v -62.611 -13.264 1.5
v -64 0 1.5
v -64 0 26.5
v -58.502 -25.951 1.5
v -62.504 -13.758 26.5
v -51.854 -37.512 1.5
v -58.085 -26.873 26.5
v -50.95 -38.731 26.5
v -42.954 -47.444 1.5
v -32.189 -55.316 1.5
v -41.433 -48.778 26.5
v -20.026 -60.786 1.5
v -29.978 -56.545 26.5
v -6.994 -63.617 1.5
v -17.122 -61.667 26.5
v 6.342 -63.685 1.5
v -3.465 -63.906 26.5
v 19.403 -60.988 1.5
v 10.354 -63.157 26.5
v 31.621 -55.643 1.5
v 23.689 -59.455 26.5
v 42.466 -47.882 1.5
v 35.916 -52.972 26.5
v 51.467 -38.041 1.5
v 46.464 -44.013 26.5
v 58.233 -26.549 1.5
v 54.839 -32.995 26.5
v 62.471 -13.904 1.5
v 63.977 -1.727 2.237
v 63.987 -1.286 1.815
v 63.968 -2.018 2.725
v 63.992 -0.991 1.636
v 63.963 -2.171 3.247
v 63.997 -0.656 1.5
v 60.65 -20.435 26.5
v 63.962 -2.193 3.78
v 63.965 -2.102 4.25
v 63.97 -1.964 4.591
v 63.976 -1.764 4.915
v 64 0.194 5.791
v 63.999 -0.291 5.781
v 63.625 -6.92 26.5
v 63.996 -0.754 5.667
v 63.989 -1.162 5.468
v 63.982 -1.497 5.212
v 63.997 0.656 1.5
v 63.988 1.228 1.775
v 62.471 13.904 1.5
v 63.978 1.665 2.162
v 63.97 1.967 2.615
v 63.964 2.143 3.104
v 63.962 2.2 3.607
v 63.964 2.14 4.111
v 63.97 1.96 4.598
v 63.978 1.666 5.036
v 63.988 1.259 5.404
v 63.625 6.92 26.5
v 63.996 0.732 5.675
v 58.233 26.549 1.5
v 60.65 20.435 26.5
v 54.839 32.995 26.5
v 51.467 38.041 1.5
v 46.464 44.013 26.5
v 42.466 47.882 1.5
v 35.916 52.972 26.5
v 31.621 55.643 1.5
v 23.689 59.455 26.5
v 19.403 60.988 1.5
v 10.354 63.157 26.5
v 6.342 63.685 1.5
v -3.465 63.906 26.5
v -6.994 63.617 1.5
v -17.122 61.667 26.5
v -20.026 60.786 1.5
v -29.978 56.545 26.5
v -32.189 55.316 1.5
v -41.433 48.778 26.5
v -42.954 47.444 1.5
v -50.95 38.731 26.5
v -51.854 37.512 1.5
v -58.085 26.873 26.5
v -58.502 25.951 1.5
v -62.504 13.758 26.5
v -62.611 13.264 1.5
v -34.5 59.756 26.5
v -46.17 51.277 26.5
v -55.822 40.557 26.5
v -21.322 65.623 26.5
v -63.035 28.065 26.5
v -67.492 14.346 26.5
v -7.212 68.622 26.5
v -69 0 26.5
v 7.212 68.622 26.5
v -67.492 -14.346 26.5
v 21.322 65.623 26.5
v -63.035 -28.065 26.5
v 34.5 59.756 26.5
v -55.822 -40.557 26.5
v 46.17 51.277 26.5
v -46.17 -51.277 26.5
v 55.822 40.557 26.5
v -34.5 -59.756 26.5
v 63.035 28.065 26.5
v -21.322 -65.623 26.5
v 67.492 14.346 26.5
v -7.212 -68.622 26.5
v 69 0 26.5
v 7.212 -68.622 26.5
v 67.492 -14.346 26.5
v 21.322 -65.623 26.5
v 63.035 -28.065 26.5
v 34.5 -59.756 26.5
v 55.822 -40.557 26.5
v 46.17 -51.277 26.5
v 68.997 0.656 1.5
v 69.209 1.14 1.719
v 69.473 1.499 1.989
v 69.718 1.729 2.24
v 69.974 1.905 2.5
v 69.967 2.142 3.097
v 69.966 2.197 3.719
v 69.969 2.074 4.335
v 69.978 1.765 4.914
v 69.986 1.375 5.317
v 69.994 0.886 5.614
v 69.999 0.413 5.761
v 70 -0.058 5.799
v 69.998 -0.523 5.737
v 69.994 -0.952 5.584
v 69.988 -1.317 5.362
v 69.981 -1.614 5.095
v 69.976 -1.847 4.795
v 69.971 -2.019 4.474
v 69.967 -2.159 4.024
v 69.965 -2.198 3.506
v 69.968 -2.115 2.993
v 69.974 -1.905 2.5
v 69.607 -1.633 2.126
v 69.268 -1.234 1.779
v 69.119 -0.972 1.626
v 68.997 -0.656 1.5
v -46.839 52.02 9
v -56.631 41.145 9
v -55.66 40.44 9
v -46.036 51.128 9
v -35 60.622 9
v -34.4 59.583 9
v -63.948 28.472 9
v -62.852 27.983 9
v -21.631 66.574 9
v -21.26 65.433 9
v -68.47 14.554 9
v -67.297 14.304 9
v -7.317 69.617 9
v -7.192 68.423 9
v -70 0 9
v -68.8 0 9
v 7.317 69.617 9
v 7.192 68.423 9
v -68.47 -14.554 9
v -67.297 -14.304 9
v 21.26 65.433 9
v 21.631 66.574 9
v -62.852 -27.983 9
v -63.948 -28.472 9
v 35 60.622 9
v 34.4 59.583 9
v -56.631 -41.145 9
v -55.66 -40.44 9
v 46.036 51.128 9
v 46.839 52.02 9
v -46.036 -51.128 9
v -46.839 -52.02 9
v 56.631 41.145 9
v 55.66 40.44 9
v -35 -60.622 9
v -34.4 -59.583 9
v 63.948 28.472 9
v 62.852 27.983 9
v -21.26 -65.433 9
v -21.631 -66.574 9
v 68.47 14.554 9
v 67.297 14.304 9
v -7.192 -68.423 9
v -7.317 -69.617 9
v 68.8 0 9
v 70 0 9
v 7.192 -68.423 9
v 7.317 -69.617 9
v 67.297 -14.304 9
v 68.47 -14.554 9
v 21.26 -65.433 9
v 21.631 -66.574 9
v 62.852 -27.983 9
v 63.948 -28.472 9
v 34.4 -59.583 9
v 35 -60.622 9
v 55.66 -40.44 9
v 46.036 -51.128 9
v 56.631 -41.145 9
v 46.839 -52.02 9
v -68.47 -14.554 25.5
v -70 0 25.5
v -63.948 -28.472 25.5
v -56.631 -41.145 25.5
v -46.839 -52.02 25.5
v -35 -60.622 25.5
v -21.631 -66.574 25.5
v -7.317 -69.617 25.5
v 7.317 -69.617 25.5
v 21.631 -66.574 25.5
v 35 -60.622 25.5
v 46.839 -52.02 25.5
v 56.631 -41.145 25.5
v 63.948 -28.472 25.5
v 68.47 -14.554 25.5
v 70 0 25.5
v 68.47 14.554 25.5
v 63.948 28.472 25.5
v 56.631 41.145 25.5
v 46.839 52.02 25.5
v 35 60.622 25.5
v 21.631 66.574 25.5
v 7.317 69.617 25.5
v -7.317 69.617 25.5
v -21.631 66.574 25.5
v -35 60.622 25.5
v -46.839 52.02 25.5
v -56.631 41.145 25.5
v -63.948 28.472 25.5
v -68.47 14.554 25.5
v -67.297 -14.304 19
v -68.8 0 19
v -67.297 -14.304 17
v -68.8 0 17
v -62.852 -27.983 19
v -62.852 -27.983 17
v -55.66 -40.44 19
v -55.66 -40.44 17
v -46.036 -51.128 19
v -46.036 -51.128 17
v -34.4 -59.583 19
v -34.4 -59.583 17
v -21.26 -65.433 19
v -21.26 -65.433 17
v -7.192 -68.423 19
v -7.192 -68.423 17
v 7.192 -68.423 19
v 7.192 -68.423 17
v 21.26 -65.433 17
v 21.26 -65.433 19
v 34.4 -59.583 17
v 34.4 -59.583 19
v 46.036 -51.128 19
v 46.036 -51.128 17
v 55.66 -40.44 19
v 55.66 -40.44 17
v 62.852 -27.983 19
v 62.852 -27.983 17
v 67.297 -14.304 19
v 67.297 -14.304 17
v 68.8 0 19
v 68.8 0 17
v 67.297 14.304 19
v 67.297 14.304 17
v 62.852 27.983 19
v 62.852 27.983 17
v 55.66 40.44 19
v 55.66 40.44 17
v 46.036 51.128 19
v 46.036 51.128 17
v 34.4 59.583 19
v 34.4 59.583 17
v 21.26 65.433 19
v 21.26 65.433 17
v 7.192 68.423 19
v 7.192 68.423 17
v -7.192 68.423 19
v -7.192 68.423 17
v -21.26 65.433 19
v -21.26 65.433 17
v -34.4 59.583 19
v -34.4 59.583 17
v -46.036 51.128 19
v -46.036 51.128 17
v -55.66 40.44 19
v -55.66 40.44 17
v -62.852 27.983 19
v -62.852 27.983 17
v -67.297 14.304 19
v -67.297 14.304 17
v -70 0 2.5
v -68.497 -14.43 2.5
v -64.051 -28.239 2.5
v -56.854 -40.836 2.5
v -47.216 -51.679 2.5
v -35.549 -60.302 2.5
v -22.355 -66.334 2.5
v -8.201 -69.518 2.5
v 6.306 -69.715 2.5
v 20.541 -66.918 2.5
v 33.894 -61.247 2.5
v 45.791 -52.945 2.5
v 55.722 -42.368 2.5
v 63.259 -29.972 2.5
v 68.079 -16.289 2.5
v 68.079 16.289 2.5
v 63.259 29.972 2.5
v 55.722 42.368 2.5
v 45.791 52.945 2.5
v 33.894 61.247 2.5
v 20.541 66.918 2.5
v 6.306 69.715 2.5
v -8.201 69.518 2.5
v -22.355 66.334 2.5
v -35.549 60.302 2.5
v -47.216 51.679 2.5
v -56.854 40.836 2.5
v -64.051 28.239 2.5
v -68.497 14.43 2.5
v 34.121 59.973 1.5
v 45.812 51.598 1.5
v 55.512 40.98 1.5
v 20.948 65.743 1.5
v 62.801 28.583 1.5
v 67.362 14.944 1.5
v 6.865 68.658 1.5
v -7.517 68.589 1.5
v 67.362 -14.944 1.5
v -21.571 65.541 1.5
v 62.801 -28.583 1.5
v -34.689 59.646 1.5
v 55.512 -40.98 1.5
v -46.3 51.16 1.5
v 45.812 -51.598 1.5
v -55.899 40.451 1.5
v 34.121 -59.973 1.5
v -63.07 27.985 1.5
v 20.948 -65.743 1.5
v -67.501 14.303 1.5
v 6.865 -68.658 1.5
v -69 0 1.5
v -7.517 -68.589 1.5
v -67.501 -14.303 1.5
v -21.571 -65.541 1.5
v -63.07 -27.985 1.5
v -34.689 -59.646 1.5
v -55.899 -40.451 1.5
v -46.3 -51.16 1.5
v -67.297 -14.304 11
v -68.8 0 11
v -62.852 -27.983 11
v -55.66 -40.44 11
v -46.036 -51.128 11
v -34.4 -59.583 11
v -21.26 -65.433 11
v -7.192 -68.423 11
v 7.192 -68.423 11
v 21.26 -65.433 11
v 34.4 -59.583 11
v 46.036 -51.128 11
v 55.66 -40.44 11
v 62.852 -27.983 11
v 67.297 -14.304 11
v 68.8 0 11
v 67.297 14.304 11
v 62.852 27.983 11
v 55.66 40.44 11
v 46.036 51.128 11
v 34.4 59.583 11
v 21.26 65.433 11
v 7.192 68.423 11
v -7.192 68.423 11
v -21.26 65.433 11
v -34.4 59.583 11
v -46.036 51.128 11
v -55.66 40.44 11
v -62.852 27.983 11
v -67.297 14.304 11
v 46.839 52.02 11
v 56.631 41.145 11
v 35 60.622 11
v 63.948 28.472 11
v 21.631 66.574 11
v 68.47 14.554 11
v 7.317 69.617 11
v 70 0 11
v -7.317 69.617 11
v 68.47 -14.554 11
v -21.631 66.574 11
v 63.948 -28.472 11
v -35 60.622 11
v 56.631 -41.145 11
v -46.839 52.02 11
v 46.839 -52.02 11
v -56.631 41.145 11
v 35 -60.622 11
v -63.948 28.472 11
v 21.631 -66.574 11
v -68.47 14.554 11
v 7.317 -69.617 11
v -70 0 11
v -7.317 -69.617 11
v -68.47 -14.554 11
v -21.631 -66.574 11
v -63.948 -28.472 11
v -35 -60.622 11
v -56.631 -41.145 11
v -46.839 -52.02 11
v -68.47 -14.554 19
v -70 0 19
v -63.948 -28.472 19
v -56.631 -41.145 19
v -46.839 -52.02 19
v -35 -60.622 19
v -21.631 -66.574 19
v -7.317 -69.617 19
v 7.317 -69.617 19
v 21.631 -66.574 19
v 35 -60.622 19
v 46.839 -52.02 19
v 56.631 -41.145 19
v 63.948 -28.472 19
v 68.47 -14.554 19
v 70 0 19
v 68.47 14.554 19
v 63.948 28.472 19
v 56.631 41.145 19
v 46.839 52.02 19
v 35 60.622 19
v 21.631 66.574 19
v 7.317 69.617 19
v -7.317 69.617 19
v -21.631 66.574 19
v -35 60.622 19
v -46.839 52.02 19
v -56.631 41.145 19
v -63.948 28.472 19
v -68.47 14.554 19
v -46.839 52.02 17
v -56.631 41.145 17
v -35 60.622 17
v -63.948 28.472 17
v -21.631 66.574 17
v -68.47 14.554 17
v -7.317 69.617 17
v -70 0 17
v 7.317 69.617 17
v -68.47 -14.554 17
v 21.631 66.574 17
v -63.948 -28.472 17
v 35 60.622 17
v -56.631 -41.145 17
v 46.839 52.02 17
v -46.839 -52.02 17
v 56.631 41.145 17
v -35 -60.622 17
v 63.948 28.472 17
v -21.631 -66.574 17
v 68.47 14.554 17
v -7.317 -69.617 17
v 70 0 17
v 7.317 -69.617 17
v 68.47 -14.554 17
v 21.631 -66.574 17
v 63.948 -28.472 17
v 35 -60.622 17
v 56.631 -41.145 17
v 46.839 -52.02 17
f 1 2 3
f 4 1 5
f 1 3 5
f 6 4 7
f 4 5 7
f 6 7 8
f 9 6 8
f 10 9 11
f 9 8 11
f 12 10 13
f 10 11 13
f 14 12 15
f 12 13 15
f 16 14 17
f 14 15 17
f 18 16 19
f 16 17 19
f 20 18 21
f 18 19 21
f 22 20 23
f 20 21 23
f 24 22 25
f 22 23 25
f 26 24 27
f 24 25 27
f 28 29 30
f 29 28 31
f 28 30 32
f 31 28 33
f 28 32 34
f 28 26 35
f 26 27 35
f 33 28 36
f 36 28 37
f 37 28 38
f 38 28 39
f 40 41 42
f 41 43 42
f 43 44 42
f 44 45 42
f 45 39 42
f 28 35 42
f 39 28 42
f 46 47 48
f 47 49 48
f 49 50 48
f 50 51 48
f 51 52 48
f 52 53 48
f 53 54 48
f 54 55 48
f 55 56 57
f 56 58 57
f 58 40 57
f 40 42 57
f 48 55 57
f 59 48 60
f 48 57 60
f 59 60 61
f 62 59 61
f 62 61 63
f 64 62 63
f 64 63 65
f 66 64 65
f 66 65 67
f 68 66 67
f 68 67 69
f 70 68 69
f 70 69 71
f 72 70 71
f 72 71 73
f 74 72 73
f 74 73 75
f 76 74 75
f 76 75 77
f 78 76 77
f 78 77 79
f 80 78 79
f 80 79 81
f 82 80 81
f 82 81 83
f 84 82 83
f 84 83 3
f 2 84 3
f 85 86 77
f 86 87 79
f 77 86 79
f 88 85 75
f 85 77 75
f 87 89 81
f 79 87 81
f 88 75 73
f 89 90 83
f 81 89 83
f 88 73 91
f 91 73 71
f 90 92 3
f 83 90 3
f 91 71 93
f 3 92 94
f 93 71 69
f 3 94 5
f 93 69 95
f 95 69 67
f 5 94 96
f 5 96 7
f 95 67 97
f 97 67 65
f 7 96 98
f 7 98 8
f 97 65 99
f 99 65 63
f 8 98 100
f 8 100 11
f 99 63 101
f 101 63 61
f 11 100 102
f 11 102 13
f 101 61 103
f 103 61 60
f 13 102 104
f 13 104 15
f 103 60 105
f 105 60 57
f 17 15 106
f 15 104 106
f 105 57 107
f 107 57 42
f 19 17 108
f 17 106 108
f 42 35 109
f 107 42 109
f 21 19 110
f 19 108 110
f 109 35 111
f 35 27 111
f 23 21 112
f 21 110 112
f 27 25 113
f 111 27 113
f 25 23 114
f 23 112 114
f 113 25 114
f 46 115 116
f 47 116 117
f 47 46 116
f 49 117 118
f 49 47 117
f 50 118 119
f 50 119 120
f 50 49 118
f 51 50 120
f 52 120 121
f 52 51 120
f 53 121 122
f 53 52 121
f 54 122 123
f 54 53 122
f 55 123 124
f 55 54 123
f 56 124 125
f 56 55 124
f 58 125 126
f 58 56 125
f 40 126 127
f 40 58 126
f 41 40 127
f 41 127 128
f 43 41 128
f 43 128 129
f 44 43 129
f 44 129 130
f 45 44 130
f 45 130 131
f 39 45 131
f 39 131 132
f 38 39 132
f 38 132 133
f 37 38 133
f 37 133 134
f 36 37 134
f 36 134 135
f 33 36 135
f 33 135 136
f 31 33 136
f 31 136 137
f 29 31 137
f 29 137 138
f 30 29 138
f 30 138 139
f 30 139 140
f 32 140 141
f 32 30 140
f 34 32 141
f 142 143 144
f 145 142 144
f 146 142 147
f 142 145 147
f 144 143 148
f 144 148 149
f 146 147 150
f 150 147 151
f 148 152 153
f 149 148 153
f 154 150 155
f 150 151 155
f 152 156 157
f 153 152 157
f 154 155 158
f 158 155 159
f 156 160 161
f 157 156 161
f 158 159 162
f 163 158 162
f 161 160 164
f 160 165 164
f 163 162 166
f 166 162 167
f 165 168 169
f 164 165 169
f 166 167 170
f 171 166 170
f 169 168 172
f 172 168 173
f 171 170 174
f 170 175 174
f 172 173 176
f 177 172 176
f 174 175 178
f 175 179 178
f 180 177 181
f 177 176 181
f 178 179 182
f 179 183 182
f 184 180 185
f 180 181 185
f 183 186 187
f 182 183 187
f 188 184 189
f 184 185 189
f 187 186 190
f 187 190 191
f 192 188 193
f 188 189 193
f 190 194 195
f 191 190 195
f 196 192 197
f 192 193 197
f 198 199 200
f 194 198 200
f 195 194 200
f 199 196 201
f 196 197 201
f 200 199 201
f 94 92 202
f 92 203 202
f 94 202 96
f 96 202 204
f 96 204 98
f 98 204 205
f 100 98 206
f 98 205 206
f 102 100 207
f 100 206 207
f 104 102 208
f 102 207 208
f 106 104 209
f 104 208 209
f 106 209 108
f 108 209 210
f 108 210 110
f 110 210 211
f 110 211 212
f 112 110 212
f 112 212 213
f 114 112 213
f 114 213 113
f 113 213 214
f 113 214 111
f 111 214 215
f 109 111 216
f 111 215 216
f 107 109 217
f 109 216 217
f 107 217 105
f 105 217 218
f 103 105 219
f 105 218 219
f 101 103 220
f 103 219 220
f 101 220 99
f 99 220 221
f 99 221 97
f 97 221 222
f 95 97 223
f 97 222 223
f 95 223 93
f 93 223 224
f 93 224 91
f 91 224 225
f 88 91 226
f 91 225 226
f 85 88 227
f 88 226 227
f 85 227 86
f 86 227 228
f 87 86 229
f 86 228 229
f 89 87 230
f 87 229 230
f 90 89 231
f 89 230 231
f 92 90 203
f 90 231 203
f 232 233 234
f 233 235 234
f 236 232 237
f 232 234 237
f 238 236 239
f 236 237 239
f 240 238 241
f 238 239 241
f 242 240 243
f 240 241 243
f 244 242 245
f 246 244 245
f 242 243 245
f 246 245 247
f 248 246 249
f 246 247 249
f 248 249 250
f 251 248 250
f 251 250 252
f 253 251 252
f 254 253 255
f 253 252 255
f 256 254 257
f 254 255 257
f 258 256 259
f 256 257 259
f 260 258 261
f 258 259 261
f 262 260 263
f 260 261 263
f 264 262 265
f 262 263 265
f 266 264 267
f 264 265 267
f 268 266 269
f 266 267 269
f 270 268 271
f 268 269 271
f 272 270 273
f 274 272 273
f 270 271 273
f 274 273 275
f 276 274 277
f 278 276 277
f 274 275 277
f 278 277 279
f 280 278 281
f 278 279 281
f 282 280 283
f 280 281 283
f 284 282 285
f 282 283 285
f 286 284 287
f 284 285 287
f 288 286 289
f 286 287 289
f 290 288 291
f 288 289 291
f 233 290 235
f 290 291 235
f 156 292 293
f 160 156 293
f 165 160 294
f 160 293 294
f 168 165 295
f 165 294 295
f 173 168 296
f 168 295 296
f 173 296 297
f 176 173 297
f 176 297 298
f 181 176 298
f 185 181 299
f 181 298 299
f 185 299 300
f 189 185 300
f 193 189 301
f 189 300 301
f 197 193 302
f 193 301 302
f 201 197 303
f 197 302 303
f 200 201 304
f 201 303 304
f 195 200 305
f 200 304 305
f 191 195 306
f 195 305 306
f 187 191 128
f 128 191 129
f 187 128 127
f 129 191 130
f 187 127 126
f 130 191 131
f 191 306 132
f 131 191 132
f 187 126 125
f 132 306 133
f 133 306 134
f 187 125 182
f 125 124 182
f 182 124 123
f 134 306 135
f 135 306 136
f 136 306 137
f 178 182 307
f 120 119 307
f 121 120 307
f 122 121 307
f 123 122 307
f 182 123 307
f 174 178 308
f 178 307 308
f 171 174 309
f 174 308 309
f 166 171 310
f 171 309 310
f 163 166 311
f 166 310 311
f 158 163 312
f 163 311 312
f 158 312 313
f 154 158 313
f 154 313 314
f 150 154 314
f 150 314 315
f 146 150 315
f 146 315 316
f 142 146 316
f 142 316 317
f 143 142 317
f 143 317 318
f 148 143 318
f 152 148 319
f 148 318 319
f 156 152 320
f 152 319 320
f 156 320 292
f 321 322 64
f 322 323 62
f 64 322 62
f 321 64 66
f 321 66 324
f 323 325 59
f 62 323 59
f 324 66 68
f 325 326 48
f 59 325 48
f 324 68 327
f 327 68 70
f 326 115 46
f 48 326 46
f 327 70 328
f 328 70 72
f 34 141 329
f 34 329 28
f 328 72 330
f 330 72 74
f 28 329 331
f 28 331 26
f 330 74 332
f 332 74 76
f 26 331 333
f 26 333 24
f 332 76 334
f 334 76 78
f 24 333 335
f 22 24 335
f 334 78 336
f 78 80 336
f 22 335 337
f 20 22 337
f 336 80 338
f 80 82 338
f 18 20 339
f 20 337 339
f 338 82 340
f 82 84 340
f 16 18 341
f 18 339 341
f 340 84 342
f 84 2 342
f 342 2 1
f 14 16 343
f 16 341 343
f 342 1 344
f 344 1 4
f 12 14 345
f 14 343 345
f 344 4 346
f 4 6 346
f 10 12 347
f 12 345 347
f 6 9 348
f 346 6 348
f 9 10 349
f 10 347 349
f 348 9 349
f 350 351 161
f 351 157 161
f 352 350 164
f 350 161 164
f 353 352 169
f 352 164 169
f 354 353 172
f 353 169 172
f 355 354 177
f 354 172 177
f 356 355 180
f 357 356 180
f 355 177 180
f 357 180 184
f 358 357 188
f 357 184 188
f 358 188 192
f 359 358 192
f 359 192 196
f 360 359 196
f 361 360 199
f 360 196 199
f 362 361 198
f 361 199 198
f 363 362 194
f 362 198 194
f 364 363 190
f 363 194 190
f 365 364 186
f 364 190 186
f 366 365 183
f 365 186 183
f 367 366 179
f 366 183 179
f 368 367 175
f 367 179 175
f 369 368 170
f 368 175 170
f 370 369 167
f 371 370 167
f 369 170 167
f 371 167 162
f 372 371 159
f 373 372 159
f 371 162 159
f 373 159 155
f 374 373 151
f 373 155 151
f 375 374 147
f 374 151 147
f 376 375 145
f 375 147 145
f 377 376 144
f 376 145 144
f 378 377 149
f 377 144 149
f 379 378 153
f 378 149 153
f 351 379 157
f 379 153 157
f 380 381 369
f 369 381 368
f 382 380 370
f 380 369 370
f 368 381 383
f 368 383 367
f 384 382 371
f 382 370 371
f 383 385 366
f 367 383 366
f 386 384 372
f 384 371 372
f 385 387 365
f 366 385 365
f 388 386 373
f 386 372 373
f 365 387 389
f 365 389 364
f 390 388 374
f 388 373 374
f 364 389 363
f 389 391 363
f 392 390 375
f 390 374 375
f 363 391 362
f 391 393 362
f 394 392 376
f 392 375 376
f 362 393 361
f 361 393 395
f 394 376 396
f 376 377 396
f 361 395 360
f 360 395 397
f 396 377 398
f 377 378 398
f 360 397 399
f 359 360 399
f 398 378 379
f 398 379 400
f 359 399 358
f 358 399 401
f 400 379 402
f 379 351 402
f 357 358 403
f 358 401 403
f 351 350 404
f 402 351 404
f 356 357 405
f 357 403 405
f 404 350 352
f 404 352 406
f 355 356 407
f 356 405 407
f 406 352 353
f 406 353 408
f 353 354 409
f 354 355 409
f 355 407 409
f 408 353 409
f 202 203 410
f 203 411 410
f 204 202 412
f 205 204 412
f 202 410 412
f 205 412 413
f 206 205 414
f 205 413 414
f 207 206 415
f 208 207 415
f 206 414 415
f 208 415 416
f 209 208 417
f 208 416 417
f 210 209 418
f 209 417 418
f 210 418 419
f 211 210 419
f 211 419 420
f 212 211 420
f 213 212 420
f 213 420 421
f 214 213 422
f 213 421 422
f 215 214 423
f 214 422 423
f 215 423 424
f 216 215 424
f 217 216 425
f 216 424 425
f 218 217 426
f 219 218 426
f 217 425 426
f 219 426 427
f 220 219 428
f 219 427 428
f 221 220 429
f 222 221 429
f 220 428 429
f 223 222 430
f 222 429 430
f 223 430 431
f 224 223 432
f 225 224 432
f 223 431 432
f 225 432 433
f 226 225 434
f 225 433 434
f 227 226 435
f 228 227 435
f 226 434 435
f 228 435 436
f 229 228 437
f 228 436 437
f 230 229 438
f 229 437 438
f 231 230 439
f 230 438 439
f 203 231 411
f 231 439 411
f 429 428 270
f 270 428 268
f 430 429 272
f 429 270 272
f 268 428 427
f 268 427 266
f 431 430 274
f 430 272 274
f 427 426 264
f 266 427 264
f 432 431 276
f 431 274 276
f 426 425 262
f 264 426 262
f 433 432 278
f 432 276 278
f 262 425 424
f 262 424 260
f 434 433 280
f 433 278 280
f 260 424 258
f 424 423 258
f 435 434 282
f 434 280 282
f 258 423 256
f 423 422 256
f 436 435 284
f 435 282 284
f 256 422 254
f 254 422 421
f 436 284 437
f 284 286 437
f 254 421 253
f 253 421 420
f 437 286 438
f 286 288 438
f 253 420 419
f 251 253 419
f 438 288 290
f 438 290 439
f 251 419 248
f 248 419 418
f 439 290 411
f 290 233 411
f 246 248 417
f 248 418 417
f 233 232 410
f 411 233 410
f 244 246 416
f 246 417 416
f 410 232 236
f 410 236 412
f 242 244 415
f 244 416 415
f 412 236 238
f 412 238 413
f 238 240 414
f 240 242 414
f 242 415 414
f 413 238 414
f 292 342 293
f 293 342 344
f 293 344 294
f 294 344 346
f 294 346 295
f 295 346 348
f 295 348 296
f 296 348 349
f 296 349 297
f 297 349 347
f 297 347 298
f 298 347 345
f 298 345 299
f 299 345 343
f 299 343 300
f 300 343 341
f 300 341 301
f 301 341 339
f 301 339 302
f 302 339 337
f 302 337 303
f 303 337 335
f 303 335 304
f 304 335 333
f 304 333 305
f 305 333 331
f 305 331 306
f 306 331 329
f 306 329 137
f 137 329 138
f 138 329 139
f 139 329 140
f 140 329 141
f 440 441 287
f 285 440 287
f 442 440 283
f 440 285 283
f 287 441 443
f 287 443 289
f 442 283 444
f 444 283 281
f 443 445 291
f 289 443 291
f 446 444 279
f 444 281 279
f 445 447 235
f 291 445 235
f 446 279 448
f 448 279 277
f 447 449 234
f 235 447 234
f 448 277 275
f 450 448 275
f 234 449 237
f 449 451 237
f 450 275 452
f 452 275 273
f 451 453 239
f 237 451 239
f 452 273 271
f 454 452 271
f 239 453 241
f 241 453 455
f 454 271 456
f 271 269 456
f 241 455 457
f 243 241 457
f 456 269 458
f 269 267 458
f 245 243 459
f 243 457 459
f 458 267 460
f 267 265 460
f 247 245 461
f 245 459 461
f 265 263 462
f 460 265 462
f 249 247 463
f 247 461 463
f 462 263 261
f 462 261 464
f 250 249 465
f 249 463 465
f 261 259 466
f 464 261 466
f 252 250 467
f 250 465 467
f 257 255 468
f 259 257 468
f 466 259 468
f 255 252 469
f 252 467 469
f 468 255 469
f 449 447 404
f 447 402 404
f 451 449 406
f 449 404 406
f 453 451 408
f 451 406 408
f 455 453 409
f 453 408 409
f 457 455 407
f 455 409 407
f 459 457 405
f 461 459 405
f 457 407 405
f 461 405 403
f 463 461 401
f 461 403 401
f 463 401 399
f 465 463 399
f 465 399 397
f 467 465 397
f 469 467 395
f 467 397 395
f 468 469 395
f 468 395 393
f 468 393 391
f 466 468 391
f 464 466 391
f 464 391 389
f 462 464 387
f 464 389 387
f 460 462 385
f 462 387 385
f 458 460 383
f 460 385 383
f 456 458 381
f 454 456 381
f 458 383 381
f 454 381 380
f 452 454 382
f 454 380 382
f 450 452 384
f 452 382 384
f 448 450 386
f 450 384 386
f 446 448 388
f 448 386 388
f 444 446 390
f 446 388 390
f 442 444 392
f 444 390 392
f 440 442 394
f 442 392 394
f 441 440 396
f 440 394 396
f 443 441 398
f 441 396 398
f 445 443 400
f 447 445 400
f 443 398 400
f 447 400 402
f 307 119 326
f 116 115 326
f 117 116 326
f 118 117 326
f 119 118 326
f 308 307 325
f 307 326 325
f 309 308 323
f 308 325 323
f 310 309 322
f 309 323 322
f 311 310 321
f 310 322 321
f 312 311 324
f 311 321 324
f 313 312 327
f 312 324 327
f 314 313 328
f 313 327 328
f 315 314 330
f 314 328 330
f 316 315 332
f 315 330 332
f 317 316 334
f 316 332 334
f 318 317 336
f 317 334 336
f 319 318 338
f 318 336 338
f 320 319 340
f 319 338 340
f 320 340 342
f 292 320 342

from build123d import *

# Parameters (mm, degrees)
SKETCH2_R           = 2.2
GRUB_KEY_HOLE_DEPTH = 8


with BuildPart() as part:
    # Sketch1 → Tyre (revolve)
    with BuildSketch(Plane(origin=(0, 0, 0), x_dir=(0, 0, -1), z_dir=(1, 0, 0)), mode=Mode.PRIVATE) as tyre_sk:
        Polygon((-1.5, 64), (-26.5, 64), (-26.5, 69), (-25.5, 70), (-19, 70), (-19, 68.8), (-17, 68.8), (-17, 70), (-11, 70), (-11, 68.8), (-9, 68.8), (-9, 70), (-2.5, 70), (-1.5, 69), align=None)
    revolve(tyre_sk.sketch.rotate(Axis((0, 0, 0), (0, 0, 1)), 90), axis=Axis((0, 0, 0), (0, 0, 1)))

    # Sketch2 → Grub_key_hole (cut)
    with BuildSketch(Plane(origin=(63, 0, 0), x_dir=(0, 0, -1), z_dir=(1, 0, 0))):
        with Locations((-3.6, 0)):
            Circle(SKETCH2_R)
    extrude(amount=GRUB_KEY_HOLE_DEPTH, mode=Mode.SUBTRACT)


solid = part.part
